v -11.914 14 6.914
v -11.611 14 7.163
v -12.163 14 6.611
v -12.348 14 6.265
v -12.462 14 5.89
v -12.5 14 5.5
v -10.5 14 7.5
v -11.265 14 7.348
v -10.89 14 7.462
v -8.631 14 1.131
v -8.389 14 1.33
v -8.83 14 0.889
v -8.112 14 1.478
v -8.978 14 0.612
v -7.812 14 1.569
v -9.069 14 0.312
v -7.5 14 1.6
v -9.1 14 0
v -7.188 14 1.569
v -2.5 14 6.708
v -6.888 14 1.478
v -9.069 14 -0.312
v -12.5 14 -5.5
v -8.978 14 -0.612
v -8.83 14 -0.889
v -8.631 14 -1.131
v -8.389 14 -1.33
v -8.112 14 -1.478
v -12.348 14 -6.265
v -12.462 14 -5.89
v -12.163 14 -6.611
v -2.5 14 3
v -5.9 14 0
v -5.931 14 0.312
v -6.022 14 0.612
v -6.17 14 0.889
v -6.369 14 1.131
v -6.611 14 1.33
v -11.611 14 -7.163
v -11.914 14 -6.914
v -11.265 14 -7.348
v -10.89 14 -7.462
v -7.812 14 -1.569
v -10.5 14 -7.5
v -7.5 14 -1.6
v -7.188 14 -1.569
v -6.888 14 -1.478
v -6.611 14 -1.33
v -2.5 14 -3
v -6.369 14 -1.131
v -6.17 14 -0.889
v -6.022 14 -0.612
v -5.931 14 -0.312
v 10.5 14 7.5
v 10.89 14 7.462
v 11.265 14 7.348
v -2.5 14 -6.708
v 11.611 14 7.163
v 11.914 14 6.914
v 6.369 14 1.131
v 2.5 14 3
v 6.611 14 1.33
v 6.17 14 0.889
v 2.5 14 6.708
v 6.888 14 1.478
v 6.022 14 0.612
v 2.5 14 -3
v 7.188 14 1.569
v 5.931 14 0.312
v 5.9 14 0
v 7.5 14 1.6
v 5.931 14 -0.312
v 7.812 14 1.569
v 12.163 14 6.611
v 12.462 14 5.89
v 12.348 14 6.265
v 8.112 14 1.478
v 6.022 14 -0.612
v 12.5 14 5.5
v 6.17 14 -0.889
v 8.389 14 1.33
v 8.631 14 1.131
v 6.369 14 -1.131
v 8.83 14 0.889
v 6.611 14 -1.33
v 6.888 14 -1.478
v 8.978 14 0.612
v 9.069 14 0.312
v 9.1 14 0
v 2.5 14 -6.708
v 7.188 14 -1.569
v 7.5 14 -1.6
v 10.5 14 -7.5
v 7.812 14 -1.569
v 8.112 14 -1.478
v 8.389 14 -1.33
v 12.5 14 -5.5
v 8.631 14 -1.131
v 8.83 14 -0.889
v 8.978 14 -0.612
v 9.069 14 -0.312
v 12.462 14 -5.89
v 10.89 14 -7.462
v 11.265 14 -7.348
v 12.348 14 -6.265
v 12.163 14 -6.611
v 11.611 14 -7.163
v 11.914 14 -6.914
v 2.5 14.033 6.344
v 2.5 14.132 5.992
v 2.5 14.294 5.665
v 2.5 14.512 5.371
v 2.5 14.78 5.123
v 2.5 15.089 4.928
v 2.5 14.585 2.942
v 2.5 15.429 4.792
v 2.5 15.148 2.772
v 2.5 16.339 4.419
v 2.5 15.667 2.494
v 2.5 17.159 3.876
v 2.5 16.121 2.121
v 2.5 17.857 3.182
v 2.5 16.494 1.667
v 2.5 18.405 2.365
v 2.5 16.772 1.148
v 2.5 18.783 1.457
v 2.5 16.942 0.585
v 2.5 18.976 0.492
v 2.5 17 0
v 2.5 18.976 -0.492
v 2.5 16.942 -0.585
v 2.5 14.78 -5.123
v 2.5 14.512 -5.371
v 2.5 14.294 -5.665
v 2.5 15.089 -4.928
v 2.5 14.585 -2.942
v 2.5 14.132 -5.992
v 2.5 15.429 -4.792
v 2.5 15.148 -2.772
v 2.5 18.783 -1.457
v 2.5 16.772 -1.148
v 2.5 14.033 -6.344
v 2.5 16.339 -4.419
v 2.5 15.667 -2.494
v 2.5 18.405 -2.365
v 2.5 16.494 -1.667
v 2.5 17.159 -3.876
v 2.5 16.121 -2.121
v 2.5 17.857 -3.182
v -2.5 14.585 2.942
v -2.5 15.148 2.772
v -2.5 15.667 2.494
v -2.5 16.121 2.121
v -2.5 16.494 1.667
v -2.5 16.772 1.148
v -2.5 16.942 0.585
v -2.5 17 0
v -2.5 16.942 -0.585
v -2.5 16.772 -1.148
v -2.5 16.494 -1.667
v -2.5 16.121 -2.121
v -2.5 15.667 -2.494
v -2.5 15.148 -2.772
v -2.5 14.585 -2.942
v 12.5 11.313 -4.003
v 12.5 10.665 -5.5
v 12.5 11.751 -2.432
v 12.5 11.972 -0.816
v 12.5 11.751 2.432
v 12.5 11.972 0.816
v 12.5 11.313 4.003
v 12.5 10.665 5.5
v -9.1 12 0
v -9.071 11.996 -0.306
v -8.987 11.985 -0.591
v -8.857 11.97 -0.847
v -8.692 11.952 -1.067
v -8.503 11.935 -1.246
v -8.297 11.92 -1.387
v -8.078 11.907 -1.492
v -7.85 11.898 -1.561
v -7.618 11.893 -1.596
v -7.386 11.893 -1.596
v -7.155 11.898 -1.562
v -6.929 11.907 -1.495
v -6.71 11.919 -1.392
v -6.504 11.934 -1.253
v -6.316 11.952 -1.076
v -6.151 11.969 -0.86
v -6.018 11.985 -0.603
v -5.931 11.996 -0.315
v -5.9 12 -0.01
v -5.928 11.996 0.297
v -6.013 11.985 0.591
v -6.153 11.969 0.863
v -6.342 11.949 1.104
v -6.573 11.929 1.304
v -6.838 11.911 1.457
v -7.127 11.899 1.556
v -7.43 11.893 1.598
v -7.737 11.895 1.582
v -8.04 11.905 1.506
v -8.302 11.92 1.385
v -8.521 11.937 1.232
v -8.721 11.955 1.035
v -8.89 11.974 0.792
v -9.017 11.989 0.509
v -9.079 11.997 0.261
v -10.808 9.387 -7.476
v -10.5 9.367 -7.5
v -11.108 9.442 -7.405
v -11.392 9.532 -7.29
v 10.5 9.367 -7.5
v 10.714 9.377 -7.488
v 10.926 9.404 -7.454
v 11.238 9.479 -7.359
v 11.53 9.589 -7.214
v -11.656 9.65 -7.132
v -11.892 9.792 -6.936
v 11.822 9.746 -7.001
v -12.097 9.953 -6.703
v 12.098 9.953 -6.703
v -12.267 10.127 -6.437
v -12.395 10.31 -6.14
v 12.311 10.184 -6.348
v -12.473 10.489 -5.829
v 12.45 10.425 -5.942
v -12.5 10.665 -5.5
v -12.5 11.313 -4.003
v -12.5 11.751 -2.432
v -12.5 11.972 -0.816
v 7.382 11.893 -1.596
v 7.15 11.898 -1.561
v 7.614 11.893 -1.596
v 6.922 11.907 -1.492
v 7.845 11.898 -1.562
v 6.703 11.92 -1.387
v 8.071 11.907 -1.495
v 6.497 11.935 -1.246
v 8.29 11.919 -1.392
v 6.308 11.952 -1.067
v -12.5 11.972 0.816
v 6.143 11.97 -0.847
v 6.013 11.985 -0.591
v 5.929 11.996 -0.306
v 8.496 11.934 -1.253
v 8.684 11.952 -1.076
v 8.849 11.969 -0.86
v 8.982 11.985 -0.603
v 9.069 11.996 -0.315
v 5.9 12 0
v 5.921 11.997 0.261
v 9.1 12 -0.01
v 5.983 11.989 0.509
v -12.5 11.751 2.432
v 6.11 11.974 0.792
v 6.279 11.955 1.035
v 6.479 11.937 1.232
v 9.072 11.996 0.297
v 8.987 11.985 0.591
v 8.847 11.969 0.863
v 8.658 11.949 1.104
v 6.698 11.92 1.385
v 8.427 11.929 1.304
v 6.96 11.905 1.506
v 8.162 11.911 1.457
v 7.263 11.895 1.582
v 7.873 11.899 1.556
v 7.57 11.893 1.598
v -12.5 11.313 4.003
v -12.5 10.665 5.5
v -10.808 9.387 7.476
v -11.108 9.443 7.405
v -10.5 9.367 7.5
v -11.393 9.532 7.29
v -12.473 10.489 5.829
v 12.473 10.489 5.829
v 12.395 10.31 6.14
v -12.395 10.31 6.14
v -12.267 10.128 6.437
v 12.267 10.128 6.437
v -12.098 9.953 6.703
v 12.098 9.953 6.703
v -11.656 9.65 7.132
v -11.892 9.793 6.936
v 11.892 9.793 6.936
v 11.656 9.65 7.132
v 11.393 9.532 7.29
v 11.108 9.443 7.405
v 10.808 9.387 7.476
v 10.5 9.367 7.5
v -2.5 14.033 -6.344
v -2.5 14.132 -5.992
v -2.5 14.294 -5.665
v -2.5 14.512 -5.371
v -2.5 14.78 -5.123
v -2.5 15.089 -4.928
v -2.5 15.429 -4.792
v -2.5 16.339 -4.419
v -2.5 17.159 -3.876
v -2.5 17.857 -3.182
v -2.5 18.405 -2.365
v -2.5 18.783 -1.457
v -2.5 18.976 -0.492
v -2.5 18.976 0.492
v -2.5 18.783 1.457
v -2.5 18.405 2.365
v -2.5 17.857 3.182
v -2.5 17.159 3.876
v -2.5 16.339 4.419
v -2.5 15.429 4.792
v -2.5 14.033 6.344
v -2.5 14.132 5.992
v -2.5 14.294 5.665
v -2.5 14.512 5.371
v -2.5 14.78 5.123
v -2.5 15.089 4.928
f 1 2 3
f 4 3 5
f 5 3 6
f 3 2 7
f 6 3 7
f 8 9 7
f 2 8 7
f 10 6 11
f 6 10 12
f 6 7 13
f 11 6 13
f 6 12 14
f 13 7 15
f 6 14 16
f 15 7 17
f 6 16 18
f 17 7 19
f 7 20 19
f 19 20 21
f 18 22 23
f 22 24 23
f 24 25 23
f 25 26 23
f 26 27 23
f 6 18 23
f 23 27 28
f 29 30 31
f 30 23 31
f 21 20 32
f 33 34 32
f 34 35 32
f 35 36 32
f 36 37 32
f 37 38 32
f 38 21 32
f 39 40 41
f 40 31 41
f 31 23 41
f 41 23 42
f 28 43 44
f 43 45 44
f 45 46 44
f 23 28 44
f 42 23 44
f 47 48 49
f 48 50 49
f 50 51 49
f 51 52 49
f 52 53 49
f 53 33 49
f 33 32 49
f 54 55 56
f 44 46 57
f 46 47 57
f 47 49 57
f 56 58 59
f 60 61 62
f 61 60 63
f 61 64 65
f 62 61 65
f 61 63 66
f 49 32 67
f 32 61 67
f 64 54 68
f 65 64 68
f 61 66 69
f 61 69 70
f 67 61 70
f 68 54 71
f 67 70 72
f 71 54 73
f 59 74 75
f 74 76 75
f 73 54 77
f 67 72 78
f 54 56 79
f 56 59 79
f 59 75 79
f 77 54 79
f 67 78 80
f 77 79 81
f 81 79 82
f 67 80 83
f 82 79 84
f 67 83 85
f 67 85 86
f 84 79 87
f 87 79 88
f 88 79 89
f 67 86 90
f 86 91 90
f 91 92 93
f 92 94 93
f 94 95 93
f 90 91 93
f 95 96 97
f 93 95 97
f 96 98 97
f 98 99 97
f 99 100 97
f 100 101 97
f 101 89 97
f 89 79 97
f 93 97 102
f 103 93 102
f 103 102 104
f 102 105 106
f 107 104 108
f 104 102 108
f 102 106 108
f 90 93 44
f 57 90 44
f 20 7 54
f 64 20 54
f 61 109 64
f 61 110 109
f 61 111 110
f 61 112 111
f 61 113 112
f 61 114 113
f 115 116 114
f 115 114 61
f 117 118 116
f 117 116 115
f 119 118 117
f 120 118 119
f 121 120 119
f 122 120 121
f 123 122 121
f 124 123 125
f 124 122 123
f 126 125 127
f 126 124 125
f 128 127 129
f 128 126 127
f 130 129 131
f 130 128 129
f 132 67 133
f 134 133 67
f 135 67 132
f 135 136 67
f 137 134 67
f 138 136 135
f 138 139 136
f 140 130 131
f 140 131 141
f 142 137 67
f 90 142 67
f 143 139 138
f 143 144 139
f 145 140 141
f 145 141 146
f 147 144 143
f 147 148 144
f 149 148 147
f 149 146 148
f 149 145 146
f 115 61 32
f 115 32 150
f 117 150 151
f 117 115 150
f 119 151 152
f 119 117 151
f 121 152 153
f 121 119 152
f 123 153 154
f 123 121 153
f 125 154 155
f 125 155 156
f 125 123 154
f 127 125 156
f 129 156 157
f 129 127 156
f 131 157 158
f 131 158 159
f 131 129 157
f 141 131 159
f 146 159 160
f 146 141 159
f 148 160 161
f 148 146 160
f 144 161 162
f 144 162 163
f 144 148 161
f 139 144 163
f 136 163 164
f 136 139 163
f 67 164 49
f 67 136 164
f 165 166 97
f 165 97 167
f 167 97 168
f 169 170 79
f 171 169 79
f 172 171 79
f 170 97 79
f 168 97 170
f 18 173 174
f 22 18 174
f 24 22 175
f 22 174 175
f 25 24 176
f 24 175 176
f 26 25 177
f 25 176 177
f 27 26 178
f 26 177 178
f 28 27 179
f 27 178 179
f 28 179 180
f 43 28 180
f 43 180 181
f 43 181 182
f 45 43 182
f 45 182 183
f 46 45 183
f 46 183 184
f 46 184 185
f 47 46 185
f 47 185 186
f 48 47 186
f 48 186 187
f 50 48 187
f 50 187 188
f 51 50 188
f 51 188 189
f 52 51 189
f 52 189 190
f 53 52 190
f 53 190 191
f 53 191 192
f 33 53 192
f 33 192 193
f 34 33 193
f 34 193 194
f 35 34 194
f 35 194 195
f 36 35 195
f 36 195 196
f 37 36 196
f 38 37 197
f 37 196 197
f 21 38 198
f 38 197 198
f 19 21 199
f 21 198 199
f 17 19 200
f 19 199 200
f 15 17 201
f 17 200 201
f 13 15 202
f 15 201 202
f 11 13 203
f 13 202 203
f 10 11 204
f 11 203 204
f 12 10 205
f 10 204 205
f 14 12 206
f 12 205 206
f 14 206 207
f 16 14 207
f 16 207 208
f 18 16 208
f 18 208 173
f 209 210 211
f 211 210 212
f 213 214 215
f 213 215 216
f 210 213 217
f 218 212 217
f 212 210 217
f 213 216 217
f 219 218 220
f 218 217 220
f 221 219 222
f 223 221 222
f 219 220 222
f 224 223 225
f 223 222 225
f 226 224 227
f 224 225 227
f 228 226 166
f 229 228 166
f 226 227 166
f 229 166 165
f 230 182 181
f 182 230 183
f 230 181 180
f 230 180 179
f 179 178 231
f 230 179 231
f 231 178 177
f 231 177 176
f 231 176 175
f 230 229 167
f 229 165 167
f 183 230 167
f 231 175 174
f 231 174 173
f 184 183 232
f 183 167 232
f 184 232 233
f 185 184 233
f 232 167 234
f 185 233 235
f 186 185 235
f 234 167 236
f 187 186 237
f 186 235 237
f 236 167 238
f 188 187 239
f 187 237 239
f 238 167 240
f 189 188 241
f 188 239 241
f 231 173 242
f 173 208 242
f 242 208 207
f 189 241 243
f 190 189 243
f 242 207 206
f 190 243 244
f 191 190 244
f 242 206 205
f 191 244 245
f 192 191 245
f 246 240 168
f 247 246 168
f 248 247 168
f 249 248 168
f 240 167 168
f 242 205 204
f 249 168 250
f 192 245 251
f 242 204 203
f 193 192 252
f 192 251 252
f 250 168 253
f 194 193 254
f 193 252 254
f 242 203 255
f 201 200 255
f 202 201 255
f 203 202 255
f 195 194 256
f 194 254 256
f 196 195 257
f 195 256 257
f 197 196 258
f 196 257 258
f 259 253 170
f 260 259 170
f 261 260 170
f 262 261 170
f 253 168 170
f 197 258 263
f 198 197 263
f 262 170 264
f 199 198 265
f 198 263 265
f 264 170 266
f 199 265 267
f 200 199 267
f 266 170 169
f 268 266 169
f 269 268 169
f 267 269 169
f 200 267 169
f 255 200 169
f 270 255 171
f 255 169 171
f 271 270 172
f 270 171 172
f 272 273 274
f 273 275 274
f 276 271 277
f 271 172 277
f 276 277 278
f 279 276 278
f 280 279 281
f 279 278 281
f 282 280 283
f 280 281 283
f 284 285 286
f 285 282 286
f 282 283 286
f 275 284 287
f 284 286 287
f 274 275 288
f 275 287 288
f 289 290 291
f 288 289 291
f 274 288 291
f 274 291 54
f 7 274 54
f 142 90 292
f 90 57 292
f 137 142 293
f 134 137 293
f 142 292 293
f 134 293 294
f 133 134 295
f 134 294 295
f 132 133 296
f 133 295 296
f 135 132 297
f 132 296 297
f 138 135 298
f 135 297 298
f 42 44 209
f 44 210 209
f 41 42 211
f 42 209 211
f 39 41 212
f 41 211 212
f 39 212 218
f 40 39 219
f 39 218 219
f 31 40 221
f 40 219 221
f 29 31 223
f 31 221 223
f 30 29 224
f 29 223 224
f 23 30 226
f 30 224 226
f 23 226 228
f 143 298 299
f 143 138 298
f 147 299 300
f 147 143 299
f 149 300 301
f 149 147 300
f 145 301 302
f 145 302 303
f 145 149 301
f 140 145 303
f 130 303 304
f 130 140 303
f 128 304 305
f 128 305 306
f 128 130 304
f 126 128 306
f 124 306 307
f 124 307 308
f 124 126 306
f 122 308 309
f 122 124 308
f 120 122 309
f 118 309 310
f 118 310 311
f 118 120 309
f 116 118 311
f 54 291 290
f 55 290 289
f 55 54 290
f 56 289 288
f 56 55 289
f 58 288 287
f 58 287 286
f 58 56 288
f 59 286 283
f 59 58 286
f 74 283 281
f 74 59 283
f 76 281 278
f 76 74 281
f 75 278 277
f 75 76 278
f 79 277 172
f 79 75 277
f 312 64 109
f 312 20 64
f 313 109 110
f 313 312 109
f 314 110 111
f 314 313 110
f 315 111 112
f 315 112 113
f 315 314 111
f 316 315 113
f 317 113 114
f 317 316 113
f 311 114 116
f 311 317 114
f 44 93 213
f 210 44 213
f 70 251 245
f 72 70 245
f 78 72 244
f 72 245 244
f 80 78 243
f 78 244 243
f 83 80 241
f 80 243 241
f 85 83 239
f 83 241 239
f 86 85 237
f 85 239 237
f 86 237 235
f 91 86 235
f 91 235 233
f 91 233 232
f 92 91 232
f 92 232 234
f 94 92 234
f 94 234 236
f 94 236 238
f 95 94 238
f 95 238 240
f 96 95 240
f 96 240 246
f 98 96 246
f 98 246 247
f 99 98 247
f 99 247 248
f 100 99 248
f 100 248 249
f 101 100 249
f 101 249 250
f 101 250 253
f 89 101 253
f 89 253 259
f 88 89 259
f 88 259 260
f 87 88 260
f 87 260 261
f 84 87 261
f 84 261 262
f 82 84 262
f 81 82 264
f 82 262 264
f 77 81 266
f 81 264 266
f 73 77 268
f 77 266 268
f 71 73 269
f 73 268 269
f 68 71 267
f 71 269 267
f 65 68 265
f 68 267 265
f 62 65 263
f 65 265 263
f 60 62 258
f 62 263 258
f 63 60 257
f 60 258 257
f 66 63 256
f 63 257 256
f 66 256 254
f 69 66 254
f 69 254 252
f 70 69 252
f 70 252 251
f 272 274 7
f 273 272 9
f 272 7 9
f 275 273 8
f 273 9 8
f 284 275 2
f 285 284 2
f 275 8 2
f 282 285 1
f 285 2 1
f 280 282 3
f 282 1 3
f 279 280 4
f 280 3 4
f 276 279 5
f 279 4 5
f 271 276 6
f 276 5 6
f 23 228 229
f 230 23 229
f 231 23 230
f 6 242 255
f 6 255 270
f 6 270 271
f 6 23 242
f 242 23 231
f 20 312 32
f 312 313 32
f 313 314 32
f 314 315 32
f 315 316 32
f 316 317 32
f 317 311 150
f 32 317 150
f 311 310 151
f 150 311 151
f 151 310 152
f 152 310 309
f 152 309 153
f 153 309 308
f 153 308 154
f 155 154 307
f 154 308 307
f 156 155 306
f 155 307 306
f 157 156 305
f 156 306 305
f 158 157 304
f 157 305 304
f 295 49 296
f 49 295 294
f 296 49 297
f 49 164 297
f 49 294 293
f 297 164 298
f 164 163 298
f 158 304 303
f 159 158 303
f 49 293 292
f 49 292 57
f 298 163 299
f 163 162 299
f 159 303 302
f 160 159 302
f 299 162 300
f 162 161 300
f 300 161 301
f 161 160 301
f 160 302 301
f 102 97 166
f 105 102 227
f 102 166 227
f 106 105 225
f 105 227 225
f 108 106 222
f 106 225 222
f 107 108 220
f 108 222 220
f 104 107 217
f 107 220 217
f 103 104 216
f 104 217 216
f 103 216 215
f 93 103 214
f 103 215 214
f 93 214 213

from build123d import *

# Parameters (mm, degrees)
BOSS_EXTRUDE1_DEPTH  = 12.5
BOSS_EXTRUDE2_DEPTH  = 2.5
FILLET1_R            = 2
M3_CLEARANCE_HOLE1_D = 3.2


with BuildPart() as part:
    # Sketch1 → Boss-Extrude1 (new, symmetric)
    with BuildSketch(Plane(origin=(0, 0, 0), x_dir=(0, 0, -1), z_dir=(1, 0, 0))):
        with BuildLine():
            Line((-7.5, 9.367496998), (-7.5, 14))
            Line((-7.5, 14), (7.5, 14))
            Line((7.5, 14), (7.5, 9.367496998))
            ThreePointArc((7.5, 9.367496998), (0, 12), (-7.5, 9.367496998))
        make_face()
    extrude(amount=BOSS_EXTRUDE1_DEPTH, both=True)

    # Sketch2 → Boss-Extrude2 (add, symmetric)
    with BuildSketch(Plane(origin=(0, 0, 0), x_dir=(0, 0, -1), z_dir=(1, 0, 0))):
        with BuildLine():
            Line((-5, 14), (-3, 14))
            ThreePointArc((-3, 14), (0, 17), (3, 14))
            Line((3, 14), (5, 14))
            ThreePointArc((5, 14), (0, 19), (-5, 14))
        make_face()
    extrude(amount=BOSS_EXTRUDE2_DEPTH, both=True)

    # Fillet1
    fillet1_edges = [part.edges().sort_by_distance(p)[0] for p in [
        (0, 14, -5),
        (0, 14, 5),
    ]]
    fillet(fillet1_edges, radius=FILLET1_R)
    fillet1_2_edges = [part.edges().sort_by_distance(p)[0] for p in [
        (12.5, 11.683748499, 7.5),
        (-12.5, 11.683748499, 7.5),
        (-12.5, 11.683748499, -7.5),
        (12.5, 11.683748499, -7.5),
    ]]
    fillet(fillet1_2_edges, radius=FILLET1_R)

    # M3 Clearance Hole1 (through all)
    with Locations(Plane(origin=(0, 14, 0), x_dir=(1, 0, 0), z_dir=(0, 1, 0))):
        with Locations((-7.5, 0), (7.5, 0)):
            Hole(M3_CLEARANCE_HOLE1_D / 2)


solid = part.part
